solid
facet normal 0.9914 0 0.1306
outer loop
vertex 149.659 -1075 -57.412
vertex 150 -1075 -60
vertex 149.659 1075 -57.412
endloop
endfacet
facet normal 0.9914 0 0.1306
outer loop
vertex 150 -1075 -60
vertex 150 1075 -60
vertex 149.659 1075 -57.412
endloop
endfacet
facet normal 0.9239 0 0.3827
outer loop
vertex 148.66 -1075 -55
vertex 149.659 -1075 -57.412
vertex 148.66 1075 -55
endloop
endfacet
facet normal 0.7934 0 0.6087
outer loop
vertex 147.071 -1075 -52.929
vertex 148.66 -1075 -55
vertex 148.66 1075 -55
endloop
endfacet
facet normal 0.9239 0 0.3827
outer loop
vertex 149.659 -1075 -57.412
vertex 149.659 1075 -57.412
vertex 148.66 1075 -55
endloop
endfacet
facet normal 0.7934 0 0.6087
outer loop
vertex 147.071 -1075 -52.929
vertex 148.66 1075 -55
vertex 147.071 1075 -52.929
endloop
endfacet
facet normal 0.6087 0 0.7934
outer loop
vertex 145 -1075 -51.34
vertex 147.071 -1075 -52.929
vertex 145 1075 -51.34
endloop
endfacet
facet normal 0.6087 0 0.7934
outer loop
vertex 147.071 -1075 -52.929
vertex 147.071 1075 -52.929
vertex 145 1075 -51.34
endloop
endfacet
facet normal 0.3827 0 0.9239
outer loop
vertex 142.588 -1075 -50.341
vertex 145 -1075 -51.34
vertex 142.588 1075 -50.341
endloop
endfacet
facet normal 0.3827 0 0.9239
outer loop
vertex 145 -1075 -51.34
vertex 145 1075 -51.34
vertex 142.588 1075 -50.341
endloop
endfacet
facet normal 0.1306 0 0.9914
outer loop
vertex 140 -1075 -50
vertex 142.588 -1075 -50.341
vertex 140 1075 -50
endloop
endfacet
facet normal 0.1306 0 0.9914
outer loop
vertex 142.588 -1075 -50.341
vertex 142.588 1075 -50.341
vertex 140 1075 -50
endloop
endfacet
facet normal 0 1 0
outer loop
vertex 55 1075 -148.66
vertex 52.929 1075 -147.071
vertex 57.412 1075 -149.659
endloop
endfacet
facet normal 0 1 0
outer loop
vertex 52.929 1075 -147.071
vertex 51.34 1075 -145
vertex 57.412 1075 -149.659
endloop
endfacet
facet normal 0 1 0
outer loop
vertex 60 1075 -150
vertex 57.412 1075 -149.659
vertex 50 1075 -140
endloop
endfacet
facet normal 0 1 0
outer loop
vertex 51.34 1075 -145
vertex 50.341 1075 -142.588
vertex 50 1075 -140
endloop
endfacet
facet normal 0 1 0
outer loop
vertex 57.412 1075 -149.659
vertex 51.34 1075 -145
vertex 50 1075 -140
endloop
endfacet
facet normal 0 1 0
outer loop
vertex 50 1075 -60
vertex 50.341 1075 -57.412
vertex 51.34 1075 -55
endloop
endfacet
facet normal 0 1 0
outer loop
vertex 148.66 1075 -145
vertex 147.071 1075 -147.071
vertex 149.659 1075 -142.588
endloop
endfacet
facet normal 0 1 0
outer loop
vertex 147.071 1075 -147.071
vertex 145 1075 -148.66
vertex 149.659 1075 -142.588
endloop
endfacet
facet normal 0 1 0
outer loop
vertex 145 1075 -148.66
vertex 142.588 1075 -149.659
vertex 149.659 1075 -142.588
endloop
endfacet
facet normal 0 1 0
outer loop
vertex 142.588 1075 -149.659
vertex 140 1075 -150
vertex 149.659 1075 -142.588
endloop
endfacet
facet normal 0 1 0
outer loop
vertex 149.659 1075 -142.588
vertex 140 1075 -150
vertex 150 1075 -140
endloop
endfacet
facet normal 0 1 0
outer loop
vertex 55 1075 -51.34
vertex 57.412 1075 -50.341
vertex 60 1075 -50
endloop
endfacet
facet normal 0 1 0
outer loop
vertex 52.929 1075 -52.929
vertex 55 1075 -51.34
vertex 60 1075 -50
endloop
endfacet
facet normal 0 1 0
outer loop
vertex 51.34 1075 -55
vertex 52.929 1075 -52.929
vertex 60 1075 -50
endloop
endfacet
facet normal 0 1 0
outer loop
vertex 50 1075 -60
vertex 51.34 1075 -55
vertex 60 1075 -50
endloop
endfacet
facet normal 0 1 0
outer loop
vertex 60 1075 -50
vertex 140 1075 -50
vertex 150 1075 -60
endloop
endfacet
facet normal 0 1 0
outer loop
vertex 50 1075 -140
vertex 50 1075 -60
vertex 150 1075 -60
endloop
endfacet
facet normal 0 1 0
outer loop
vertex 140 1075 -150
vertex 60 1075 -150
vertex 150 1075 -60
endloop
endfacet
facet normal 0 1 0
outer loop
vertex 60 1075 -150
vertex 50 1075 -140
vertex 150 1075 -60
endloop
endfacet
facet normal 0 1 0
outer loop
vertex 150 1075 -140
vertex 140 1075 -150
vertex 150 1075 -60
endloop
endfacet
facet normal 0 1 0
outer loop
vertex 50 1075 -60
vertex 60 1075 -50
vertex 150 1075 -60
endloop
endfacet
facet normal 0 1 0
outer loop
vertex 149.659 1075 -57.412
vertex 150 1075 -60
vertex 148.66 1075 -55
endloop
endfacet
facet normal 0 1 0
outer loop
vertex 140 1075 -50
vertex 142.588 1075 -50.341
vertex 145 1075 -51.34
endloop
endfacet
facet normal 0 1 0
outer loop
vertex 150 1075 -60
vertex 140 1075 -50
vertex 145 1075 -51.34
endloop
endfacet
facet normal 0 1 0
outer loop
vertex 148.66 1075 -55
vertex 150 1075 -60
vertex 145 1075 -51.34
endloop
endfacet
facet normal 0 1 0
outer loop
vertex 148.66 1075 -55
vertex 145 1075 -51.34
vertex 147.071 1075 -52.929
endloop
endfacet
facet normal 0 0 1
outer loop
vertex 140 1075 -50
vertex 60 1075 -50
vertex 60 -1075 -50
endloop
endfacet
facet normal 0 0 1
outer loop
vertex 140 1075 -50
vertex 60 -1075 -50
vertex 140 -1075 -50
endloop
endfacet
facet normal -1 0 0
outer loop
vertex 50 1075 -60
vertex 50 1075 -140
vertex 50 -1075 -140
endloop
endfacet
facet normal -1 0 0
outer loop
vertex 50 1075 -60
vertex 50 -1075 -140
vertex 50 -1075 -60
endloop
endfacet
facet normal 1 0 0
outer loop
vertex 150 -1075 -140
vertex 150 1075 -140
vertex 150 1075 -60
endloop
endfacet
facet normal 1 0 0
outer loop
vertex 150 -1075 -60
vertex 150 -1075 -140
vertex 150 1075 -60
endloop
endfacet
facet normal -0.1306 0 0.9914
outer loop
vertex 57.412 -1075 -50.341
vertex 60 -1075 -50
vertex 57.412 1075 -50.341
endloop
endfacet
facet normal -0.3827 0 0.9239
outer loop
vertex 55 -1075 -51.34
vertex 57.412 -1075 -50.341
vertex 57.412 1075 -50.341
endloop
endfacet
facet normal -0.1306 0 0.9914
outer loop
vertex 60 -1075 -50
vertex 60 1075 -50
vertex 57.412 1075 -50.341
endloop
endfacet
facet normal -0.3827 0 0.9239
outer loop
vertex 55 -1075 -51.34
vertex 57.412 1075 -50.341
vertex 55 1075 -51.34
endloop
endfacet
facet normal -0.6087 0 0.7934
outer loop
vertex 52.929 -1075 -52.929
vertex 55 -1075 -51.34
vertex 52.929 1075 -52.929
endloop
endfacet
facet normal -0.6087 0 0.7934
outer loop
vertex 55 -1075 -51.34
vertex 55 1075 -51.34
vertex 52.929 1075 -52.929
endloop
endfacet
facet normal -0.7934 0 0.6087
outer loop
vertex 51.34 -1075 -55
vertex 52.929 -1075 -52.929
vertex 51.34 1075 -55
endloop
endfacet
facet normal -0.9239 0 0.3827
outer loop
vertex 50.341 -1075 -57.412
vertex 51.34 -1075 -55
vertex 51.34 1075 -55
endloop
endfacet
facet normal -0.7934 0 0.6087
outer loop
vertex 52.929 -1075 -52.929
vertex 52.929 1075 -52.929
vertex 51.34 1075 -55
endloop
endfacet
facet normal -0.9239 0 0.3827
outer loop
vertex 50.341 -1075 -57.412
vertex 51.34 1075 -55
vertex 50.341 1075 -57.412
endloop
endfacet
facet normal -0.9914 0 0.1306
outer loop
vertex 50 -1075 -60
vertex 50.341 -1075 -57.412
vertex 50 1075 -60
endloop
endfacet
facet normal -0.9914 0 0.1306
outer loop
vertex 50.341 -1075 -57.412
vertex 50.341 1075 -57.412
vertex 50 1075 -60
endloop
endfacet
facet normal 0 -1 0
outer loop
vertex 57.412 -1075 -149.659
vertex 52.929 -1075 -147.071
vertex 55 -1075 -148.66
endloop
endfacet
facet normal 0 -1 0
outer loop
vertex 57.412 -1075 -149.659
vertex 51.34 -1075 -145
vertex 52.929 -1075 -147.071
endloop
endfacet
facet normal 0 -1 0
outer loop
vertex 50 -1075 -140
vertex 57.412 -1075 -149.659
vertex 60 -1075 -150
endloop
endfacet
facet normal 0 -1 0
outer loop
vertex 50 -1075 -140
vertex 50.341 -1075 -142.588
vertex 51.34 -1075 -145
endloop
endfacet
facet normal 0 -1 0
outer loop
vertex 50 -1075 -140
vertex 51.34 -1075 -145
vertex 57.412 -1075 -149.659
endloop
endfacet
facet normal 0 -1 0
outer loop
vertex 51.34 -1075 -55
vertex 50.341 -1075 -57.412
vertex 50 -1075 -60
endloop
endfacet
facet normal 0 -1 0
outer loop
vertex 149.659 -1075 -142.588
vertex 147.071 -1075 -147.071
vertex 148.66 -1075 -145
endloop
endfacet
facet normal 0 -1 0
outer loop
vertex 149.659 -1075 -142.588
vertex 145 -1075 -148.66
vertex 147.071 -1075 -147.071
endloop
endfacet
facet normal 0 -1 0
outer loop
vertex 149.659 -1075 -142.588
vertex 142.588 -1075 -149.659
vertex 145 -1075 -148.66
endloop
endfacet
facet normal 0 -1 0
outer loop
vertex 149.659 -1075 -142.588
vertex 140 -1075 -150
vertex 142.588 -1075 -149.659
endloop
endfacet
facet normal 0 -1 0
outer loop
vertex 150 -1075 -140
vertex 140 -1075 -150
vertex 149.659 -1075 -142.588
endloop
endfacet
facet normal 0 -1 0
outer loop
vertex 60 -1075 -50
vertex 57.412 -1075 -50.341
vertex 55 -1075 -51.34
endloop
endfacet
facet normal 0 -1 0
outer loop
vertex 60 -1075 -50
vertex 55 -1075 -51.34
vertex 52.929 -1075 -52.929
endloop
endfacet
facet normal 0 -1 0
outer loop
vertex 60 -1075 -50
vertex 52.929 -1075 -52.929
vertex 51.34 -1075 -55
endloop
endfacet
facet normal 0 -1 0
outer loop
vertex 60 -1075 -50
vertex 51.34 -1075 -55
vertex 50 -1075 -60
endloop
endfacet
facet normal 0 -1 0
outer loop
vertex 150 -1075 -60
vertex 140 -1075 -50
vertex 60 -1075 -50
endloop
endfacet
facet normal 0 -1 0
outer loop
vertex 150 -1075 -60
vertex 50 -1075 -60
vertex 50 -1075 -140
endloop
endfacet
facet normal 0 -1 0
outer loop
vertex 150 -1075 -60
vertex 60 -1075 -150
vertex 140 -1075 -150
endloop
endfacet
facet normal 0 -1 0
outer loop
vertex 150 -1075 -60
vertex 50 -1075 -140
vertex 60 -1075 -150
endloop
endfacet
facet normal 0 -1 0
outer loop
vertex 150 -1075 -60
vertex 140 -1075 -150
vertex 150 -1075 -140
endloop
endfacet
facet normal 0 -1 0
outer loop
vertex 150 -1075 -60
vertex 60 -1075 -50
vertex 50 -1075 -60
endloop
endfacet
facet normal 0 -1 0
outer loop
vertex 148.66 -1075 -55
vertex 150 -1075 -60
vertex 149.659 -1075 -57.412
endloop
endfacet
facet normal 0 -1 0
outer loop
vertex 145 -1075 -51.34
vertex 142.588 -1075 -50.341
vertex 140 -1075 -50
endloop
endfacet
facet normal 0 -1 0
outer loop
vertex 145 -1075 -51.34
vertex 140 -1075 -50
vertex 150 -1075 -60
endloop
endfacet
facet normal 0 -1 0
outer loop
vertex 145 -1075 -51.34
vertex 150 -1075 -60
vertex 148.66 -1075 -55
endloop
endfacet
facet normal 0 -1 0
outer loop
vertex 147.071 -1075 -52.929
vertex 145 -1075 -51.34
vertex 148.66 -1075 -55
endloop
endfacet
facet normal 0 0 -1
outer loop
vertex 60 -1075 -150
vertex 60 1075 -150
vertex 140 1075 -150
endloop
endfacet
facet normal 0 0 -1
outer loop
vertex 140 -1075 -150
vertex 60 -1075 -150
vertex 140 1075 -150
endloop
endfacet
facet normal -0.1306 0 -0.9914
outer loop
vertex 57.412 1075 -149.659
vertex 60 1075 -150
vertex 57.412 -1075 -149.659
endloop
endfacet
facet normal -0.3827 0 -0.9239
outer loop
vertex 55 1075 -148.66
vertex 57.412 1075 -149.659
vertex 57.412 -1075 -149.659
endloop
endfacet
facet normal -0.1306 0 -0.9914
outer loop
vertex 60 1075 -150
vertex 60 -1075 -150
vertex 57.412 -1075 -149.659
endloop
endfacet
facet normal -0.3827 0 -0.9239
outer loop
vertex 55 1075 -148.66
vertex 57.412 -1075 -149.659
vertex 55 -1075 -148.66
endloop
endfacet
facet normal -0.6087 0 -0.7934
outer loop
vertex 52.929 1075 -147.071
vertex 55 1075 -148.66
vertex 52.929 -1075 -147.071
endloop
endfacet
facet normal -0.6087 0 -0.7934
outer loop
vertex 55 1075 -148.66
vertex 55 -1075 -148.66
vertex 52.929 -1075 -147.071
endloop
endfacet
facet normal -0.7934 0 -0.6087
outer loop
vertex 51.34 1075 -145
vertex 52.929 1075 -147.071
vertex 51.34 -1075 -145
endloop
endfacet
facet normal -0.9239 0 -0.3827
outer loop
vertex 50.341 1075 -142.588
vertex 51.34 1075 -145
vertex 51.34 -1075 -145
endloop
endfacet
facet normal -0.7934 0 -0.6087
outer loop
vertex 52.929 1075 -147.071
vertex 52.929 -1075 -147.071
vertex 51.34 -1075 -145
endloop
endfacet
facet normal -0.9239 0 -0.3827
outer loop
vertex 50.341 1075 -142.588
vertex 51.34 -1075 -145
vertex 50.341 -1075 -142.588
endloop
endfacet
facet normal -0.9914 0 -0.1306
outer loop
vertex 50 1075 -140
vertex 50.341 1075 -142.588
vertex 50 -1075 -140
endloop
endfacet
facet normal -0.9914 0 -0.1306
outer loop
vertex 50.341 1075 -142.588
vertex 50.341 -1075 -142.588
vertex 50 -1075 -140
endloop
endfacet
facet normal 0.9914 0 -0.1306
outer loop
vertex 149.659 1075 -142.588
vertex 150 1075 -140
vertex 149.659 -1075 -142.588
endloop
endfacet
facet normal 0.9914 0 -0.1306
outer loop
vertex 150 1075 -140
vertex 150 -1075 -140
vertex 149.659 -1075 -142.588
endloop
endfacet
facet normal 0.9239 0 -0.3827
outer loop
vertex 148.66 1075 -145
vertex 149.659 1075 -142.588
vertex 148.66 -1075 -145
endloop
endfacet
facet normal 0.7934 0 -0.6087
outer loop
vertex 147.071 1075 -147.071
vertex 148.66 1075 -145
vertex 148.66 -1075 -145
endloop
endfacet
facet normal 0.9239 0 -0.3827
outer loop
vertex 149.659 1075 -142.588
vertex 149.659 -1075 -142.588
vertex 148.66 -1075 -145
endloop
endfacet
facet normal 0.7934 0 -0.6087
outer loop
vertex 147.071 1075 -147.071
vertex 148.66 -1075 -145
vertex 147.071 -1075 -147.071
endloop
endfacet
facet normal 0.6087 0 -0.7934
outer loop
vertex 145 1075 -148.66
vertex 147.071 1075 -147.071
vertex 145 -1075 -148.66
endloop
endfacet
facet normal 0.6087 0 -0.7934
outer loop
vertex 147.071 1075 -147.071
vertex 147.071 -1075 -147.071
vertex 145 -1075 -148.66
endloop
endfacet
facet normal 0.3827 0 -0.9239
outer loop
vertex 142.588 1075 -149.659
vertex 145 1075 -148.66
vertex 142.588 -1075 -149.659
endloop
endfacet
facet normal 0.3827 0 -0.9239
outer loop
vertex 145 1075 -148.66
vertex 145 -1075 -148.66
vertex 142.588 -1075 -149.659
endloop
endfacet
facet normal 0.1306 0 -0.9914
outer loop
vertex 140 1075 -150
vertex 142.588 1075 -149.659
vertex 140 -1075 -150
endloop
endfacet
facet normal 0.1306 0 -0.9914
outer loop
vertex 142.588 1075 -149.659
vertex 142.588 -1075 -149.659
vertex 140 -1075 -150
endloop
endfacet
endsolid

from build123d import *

# Parameters (mm, degrees)
SKETCH001_W  = 100
SKETCH001_H  = 100
PAD001_DEPTH = 1075
FILLET_R     = 10
FILLET001_R  = 10


with BuildPart() as part:
    # Sketch001 → Pad001 (new body, symmetric)
    with BuildSketch(Plane.XZ):
        with Locations((-100, -100)):
            Rectangle(SKETCH001_W, SKETCH001_H)
    extrude(amount=PAD001_DEPTH, both=True)

    # Fillet
    fillet_edges = [part.edges().sort_by_distance(p)[0] for p in [
        (-50, 0, -50),
    ]]
    fillet(fillet_edges, radius=FILLET_R)

    # Fillet001
    fillet001_edges = [part.edges().sort_by_distance(p)[0] for p in [
        (-150, 0, -150),
        (-50, 0, -150),
        (-150, 0, -50),
    ]]
    fillet(fillet001_edges, radius=FILLET001_R)


with BuildPart() as part_1:
    # Body002 placement: moved
    add(part.part.moved(Location((200, 0, 0))))


solid = part_1.part
